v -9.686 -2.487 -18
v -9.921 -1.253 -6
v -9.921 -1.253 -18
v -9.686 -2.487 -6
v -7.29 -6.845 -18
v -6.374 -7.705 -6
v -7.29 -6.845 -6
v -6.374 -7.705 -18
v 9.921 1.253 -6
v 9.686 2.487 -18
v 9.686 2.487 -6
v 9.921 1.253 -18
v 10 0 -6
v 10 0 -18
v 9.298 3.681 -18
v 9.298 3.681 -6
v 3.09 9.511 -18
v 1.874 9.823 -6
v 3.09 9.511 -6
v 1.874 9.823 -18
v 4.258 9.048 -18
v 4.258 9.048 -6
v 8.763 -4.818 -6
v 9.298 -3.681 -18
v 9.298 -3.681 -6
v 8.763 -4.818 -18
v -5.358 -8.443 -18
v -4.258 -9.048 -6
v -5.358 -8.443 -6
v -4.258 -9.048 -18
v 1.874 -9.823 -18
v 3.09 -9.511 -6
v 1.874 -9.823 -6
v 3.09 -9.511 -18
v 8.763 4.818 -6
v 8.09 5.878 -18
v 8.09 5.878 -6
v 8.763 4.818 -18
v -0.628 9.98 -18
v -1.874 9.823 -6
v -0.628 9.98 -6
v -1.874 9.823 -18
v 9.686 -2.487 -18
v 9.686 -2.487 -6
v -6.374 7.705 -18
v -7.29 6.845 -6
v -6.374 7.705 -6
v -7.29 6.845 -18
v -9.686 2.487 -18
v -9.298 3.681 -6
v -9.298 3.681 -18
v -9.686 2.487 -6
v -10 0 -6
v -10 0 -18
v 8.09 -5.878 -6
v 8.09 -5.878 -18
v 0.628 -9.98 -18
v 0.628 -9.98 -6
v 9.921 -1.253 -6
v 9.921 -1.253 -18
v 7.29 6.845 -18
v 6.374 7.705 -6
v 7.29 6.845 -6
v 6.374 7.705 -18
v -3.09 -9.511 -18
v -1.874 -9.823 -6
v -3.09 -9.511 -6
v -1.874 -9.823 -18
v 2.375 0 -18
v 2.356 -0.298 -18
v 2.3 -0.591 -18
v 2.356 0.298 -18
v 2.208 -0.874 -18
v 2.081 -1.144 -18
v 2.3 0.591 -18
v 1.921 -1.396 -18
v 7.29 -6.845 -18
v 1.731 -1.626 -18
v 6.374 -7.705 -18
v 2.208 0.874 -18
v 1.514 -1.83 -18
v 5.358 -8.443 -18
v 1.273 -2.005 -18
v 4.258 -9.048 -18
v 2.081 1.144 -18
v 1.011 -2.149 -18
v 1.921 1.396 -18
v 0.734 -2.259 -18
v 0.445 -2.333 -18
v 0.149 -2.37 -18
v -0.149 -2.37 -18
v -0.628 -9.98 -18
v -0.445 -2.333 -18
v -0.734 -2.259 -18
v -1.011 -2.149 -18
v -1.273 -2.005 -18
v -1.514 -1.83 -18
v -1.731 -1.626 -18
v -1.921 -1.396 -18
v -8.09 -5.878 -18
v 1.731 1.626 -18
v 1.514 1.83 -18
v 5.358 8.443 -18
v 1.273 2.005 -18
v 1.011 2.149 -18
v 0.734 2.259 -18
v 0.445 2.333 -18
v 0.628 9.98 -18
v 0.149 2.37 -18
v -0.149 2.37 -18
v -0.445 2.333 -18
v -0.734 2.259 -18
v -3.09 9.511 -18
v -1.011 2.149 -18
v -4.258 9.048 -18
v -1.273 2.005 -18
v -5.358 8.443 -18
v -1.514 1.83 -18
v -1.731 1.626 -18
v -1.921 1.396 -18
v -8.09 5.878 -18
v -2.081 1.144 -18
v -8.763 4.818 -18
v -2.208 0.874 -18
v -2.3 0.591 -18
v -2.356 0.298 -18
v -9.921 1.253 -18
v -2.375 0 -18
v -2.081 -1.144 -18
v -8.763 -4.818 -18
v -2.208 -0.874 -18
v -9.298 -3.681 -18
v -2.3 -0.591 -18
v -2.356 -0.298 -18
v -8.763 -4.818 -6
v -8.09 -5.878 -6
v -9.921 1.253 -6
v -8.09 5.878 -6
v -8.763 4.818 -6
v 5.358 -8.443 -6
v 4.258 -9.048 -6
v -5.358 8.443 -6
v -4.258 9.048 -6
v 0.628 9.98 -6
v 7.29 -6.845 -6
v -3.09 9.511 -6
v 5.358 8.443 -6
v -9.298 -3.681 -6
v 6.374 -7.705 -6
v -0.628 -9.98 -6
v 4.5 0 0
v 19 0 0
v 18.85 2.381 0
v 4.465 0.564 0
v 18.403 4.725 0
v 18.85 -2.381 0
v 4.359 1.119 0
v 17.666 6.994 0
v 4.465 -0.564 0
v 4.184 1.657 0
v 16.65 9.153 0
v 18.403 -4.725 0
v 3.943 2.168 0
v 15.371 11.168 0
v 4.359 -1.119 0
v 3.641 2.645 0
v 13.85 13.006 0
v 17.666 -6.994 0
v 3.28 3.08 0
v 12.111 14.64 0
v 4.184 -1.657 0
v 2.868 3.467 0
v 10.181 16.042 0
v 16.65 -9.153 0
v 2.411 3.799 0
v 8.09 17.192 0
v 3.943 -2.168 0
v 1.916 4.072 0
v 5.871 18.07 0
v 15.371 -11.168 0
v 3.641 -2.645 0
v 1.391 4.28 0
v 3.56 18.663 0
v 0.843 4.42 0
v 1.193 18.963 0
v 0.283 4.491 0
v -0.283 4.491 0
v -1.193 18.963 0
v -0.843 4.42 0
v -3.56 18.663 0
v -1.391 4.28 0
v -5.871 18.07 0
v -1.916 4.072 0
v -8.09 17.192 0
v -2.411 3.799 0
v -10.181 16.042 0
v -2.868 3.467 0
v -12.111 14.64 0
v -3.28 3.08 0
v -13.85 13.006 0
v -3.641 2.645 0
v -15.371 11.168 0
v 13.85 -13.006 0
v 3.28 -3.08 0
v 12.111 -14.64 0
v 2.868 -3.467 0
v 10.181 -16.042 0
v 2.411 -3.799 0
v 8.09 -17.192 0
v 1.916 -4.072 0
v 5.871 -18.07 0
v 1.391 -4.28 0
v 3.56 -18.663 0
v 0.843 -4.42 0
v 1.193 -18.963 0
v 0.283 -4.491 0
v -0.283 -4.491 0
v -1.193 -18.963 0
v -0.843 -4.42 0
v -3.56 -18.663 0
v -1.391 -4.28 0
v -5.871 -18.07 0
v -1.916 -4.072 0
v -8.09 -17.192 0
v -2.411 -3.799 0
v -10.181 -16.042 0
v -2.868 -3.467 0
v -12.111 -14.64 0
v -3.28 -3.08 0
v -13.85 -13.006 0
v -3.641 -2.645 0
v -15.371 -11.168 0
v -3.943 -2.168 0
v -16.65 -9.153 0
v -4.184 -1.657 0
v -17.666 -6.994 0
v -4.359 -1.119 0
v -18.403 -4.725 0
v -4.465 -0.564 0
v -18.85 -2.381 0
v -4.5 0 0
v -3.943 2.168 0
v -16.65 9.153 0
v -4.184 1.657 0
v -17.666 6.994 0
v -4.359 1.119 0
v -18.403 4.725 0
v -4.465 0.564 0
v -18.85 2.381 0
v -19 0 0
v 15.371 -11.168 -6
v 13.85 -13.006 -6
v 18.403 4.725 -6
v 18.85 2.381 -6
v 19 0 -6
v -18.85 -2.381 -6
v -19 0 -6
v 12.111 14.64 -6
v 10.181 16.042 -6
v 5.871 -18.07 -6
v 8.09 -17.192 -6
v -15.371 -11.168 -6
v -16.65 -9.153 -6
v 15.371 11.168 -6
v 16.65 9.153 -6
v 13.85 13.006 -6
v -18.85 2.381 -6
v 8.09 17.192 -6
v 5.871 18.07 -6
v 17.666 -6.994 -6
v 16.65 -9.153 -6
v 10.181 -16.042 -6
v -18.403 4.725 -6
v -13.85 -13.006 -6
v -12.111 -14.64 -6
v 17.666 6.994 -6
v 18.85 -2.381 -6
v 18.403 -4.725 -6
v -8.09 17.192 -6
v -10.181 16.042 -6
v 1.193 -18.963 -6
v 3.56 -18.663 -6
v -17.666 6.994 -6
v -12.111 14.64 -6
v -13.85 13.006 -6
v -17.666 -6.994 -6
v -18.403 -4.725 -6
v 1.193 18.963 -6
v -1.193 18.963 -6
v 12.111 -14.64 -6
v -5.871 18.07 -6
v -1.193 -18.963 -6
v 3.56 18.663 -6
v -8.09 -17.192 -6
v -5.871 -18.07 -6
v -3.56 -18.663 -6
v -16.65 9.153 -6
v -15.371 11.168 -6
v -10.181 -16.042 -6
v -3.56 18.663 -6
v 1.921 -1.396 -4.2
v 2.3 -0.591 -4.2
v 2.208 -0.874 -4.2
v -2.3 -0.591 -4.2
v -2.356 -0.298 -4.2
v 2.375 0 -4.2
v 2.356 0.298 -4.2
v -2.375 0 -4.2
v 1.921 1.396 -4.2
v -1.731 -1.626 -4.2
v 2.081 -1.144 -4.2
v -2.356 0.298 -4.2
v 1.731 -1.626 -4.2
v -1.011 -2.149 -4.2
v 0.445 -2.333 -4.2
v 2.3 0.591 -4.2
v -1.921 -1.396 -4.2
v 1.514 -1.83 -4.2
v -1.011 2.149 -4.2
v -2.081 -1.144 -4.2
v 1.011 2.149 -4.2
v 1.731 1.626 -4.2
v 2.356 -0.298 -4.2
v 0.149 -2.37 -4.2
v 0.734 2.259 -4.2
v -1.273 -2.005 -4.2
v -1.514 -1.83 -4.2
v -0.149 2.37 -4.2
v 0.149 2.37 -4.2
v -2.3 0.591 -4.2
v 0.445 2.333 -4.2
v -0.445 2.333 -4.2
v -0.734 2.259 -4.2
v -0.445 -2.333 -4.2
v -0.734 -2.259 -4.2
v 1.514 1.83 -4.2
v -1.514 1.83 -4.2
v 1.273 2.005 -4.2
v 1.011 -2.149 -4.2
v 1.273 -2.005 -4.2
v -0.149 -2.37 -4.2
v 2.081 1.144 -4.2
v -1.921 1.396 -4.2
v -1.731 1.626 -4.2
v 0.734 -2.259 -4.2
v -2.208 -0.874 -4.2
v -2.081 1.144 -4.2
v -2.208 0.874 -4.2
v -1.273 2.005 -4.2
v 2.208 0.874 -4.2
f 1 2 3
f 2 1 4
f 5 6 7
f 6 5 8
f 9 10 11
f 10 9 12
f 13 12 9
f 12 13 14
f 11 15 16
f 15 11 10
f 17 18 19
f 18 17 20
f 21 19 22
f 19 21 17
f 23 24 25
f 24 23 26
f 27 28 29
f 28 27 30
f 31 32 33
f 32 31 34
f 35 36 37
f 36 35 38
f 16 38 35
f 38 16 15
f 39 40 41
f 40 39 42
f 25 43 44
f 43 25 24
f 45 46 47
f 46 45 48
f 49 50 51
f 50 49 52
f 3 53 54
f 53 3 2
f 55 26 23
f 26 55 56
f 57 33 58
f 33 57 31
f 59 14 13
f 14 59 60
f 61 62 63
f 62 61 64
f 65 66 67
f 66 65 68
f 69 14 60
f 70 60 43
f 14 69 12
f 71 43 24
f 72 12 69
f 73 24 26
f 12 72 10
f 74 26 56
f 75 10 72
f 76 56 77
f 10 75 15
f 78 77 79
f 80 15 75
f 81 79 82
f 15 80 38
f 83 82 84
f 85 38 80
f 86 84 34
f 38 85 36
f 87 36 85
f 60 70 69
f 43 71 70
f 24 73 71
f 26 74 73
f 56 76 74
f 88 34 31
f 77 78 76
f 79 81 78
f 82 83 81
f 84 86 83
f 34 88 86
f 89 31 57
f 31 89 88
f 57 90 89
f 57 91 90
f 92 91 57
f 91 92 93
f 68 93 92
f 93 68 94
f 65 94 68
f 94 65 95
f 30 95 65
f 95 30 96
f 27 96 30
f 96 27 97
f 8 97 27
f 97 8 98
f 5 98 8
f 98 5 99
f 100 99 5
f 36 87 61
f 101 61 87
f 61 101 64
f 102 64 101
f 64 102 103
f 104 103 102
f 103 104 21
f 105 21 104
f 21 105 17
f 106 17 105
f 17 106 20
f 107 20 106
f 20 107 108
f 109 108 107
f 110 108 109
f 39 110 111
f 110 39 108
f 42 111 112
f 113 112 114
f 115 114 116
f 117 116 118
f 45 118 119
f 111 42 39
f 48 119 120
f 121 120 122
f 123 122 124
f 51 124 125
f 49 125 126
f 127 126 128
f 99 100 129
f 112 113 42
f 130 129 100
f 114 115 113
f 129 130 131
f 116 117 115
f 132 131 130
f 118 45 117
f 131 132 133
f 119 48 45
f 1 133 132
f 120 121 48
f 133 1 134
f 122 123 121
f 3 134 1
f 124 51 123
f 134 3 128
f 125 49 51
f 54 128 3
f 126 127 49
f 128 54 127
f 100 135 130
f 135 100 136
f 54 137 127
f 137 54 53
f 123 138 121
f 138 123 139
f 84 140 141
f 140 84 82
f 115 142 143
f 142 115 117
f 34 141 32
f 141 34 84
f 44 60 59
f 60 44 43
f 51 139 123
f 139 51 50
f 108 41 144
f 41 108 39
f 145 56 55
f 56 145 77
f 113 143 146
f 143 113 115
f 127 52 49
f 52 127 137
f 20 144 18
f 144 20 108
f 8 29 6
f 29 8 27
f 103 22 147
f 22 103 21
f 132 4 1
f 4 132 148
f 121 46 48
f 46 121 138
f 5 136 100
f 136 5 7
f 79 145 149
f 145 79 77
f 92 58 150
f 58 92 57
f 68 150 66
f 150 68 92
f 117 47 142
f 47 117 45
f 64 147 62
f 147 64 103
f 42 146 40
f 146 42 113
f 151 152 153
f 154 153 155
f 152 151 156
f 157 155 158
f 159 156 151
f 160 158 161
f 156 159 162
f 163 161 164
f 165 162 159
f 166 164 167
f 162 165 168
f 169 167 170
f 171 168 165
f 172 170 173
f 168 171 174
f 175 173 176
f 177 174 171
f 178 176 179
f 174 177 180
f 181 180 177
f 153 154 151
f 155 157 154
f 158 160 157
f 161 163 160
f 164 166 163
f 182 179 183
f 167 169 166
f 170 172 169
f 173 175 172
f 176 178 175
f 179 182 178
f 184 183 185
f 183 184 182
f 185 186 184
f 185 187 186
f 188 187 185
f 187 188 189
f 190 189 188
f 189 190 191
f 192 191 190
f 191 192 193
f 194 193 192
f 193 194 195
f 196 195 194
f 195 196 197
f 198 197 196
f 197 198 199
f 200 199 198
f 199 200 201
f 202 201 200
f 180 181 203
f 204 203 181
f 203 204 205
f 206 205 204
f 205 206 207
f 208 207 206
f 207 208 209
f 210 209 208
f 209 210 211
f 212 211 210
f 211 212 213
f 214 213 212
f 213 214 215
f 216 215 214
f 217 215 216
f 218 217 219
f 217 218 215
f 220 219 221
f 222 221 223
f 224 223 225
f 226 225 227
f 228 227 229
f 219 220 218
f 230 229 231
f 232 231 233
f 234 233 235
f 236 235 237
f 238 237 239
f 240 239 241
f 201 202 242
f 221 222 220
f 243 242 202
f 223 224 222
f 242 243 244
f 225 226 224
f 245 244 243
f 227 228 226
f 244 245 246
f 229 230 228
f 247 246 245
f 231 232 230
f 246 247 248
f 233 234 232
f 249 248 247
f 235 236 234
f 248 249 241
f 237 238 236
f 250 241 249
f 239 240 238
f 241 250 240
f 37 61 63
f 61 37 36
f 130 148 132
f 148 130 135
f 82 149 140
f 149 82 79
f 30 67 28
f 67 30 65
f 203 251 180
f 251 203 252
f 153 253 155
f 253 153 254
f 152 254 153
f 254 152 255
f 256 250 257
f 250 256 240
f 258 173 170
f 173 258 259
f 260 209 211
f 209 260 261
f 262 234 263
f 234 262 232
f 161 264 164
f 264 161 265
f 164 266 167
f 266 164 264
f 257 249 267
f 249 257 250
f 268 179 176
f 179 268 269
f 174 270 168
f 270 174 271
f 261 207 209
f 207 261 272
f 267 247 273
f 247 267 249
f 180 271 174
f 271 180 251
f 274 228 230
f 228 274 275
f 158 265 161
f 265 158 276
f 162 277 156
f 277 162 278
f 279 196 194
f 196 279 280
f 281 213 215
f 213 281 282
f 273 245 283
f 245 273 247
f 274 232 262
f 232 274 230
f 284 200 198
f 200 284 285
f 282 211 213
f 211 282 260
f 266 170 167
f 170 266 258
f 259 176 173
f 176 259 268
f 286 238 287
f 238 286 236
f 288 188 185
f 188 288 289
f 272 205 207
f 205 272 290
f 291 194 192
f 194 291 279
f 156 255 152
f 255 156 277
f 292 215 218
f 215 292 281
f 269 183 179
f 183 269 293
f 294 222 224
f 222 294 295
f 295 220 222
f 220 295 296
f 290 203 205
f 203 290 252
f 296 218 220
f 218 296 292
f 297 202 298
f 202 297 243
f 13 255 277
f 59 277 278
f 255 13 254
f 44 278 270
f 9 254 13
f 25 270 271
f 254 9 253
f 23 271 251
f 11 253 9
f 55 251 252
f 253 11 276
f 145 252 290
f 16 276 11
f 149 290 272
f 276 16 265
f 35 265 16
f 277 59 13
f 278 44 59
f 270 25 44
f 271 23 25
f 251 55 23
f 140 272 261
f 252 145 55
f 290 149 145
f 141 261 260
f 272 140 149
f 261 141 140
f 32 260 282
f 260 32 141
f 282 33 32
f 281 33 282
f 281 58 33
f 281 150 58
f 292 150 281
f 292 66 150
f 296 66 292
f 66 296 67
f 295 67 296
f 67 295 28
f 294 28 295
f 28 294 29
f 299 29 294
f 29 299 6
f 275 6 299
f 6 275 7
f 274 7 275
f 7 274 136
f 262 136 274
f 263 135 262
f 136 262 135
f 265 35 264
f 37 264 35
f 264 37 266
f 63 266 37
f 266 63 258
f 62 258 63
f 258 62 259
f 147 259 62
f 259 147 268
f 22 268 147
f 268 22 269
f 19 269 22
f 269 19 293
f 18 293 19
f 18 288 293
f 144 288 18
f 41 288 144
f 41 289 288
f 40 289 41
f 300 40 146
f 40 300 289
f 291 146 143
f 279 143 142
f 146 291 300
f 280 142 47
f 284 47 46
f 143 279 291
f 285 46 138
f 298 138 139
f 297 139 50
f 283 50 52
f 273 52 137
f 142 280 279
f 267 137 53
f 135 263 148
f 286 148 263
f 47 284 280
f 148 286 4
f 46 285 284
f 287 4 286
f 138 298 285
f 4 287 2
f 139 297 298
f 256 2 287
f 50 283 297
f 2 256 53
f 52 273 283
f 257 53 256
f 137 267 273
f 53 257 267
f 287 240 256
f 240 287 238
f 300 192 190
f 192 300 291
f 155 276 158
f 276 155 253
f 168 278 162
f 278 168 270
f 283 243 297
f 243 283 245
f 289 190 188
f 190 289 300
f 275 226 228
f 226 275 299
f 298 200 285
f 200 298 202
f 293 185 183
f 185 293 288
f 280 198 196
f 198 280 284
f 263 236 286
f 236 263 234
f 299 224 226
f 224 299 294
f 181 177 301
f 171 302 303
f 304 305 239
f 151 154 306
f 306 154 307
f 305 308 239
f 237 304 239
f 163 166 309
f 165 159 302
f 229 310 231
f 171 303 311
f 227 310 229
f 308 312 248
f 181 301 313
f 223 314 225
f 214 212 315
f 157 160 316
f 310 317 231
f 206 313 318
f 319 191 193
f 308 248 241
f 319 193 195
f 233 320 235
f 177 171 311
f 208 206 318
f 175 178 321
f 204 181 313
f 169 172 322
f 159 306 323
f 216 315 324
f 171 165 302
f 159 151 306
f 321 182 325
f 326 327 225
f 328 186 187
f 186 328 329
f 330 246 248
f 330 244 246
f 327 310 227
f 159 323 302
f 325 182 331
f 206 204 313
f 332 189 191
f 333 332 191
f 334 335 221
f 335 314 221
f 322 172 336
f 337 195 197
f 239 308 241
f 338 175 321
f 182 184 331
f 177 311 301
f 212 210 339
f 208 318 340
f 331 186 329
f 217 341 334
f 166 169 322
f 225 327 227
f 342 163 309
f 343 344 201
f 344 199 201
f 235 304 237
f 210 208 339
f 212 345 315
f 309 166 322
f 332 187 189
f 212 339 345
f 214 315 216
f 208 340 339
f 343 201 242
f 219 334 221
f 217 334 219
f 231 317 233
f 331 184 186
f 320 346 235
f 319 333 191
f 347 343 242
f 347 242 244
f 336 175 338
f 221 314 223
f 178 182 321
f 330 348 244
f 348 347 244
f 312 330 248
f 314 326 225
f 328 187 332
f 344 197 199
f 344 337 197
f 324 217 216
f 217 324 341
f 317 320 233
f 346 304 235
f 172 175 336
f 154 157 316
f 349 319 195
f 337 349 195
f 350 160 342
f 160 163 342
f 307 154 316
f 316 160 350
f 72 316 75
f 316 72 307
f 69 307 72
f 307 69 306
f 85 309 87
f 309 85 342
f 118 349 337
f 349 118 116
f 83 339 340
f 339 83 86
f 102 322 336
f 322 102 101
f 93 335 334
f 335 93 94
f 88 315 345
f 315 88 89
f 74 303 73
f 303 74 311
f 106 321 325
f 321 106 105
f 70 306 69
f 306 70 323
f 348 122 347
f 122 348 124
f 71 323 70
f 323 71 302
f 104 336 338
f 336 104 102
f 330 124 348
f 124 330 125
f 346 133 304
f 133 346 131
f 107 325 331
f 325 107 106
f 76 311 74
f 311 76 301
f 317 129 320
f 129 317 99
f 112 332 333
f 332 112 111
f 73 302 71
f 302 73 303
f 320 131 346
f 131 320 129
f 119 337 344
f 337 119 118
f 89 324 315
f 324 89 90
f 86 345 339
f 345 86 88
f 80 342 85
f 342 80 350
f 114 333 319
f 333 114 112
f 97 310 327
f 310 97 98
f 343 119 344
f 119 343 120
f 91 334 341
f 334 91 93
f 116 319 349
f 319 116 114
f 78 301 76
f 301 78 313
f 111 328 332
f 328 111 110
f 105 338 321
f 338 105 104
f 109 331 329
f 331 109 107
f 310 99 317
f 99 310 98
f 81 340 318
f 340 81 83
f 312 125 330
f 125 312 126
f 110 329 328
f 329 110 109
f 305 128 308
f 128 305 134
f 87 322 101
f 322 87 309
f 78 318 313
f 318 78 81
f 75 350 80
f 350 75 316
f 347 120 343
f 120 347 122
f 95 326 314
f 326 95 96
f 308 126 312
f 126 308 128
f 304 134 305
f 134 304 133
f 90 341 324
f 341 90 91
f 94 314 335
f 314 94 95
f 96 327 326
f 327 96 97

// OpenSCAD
$fn = 50;


difference() {
	union() {
		translate(v = [0, 0, -18.0000000000]) {
			cylinder(h = 18, r = 10.0000000000);
		}
		translate(v = [0, 0, -6.0000000000]) {
			cylinder(h = 6, r = 19.0000000000);
		}
	}
	union() {
		translate(v = [0, 0, 0]) {
			rotate(a = [0, 0, 0]) {
				difference() {
					union() {
						#translate(v = [0, 0, -18.0000000000]) {
							cylinder(h = 18, r = 2.2500000000);
						}
						#translate(v = [0, 0, -4.2000000000]) {
							cylinder(h = 4.2000000000, r1 = 2.3750000000, r2 = 4.5000000000);
						}
						#translate(v = [0, 0, -18.0000000000]) {
							cylinder(h = 18, r = 2.3750000000);
						}
						#translate(v = [0, 0, -18.0000000000]) {
							cylinder(h = 18, r = 2.2500000000);
						}
					}
					union();
				}
			}
		}
	}
}
